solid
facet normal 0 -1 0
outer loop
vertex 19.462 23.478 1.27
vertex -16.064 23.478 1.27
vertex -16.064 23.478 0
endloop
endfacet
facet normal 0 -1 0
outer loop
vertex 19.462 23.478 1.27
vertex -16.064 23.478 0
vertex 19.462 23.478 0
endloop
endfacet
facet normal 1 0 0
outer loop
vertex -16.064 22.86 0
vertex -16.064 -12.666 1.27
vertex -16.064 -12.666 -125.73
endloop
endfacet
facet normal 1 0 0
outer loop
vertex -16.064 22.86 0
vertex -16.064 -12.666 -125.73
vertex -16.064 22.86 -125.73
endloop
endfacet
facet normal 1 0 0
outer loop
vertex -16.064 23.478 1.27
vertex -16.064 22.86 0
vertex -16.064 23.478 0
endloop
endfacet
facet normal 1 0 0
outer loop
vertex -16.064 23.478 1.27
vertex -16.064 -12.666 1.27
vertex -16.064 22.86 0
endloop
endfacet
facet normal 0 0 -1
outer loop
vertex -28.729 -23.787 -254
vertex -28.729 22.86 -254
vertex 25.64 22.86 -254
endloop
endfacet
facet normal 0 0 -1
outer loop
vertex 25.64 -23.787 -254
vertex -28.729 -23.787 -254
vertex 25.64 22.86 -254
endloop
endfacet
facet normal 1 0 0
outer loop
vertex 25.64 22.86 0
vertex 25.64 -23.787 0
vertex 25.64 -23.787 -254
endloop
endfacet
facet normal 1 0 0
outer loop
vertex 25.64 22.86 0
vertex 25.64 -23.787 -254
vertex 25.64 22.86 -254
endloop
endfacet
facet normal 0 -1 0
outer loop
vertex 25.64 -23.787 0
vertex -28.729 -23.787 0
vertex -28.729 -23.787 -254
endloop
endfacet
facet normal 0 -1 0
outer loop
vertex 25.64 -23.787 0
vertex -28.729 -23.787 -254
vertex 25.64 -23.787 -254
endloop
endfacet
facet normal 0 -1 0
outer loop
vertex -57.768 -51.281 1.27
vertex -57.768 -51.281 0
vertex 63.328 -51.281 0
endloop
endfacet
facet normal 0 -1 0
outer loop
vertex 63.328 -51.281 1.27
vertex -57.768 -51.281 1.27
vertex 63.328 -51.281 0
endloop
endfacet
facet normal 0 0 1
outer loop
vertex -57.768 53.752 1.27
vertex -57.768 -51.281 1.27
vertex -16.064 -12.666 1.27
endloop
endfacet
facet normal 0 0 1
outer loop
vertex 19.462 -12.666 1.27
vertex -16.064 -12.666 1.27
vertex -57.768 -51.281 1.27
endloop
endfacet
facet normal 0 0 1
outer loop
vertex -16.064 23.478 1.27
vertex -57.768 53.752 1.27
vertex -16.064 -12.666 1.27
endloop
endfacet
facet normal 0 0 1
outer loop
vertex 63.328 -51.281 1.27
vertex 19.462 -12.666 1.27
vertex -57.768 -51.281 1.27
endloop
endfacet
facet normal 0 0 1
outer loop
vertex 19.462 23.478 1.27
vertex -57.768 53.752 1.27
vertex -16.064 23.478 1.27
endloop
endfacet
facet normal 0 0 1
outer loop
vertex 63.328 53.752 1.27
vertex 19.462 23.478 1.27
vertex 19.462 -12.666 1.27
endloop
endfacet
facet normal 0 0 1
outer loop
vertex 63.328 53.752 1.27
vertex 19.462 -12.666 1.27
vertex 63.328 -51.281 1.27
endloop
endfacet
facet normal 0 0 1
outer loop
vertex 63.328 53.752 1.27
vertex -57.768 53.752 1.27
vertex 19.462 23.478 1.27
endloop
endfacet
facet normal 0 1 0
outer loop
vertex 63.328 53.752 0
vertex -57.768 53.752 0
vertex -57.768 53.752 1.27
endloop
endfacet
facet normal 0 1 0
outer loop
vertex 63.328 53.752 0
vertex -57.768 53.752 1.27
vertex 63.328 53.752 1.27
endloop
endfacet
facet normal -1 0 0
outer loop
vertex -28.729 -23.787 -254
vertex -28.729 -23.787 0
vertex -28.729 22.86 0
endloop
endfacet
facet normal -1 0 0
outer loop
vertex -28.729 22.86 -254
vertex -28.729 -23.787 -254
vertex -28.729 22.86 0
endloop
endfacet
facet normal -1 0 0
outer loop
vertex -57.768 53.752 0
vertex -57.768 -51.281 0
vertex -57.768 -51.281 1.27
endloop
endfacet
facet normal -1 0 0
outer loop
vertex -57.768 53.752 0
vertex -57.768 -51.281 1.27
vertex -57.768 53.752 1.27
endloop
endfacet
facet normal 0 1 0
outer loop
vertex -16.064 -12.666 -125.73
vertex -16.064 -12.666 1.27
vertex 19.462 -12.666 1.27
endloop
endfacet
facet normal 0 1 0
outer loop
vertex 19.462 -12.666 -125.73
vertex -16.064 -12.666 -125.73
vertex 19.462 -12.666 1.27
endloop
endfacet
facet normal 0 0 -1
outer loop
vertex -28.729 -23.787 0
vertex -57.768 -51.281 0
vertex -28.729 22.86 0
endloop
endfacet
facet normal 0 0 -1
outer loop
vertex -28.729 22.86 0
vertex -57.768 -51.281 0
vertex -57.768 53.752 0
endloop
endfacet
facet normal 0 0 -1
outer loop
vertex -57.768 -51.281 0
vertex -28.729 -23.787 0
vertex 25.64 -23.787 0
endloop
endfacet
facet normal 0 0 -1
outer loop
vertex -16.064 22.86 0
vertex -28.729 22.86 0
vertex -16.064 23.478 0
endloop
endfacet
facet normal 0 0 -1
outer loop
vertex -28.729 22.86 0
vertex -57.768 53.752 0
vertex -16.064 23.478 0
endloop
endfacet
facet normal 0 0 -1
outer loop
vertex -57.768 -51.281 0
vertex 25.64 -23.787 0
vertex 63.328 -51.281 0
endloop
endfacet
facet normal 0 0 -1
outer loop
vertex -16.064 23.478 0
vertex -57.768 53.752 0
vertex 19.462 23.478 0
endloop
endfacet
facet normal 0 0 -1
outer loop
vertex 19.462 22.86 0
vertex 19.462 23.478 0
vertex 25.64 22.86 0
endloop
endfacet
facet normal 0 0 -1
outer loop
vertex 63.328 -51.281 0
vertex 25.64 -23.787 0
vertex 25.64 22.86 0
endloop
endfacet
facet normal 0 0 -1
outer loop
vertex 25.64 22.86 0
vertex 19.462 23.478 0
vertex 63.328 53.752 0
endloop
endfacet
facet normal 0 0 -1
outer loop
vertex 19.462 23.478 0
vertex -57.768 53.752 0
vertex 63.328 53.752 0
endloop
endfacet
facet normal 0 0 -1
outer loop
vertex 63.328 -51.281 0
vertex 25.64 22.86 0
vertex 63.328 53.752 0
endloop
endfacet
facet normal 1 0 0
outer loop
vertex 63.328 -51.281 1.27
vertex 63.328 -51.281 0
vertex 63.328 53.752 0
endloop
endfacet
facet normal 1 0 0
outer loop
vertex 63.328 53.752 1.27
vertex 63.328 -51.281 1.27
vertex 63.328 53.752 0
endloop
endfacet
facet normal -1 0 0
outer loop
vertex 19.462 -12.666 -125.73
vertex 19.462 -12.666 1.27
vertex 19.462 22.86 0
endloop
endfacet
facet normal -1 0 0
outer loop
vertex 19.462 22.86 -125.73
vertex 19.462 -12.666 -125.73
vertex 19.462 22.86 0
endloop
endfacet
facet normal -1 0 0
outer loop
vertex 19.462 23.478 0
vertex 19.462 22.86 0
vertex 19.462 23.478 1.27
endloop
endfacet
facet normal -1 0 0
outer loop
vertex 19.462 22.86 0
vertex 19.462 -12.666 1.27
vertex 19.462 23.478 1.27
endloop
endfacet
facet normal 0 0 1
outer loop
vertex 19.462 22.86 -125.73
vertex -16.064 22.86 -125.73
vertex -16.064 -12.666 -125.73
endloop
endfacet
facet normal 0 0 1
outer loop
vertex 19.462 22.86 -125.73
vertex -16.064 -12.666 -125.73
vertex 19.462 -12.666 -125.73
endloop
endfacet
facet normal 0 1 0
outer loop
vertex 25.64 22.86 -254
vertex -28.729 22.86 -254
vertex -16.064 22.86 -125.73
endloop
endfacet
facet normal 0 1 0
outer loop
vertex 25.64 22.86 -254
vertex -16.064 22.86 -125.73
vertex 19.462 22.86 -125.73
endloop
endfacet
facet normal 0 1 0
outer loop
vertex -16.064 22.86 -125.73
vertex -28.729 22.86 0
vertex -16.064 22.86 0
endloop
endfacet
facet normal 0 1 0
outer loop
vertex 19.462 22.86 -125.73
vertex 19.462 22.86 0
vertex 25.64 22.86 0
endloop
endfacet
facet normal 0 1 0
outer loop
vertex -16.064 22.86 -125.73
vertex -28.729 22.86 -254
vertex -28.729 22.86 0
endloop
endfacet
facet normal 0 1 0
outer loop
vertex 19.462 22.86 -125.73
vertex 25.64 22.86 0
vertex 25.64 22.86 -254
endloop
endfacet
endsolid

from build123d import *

# Parameters (mm, degrees)
F0_W     = 54.369731
F0_H     = 46.646759
F2_DEPTH = 254
F1_W     = 121.096216
F1_H     = 105.032436
F3_DEPTH = 1.27
F4_W     = 35.525674
F4_H     = 36.143513
F5_DEPTH = 127


with BuildPart() as f2:
    # F0 (on Top) → F2 (new body)
    with BuildSketch(Plane.XY):
        with Locations((-1.544595, -0.463377)):
            Rectangle(F0_W, F0_H)
    extrude(amount=-F2_DEPTH)

    # F1 (on Top) → F3 (join)
    with BuildSketch(Plane.XY):
        with Locations((2.78027, 1.235675)):
            Rectangle(F1_W, F1_H)
    extrude(amount=F3_DEPTH)

    # F4 (on face) → F5 (cut)
    with BuildSketch(Plane.XY.offset(1.27)):
        with Locations((1.699054, 5.40608)):
            Rectangle(F4_W, F4_H)
    extrude(amount=-F5_DEPTH, mode=Mode.SUBTRACT)


solid = f2.part
